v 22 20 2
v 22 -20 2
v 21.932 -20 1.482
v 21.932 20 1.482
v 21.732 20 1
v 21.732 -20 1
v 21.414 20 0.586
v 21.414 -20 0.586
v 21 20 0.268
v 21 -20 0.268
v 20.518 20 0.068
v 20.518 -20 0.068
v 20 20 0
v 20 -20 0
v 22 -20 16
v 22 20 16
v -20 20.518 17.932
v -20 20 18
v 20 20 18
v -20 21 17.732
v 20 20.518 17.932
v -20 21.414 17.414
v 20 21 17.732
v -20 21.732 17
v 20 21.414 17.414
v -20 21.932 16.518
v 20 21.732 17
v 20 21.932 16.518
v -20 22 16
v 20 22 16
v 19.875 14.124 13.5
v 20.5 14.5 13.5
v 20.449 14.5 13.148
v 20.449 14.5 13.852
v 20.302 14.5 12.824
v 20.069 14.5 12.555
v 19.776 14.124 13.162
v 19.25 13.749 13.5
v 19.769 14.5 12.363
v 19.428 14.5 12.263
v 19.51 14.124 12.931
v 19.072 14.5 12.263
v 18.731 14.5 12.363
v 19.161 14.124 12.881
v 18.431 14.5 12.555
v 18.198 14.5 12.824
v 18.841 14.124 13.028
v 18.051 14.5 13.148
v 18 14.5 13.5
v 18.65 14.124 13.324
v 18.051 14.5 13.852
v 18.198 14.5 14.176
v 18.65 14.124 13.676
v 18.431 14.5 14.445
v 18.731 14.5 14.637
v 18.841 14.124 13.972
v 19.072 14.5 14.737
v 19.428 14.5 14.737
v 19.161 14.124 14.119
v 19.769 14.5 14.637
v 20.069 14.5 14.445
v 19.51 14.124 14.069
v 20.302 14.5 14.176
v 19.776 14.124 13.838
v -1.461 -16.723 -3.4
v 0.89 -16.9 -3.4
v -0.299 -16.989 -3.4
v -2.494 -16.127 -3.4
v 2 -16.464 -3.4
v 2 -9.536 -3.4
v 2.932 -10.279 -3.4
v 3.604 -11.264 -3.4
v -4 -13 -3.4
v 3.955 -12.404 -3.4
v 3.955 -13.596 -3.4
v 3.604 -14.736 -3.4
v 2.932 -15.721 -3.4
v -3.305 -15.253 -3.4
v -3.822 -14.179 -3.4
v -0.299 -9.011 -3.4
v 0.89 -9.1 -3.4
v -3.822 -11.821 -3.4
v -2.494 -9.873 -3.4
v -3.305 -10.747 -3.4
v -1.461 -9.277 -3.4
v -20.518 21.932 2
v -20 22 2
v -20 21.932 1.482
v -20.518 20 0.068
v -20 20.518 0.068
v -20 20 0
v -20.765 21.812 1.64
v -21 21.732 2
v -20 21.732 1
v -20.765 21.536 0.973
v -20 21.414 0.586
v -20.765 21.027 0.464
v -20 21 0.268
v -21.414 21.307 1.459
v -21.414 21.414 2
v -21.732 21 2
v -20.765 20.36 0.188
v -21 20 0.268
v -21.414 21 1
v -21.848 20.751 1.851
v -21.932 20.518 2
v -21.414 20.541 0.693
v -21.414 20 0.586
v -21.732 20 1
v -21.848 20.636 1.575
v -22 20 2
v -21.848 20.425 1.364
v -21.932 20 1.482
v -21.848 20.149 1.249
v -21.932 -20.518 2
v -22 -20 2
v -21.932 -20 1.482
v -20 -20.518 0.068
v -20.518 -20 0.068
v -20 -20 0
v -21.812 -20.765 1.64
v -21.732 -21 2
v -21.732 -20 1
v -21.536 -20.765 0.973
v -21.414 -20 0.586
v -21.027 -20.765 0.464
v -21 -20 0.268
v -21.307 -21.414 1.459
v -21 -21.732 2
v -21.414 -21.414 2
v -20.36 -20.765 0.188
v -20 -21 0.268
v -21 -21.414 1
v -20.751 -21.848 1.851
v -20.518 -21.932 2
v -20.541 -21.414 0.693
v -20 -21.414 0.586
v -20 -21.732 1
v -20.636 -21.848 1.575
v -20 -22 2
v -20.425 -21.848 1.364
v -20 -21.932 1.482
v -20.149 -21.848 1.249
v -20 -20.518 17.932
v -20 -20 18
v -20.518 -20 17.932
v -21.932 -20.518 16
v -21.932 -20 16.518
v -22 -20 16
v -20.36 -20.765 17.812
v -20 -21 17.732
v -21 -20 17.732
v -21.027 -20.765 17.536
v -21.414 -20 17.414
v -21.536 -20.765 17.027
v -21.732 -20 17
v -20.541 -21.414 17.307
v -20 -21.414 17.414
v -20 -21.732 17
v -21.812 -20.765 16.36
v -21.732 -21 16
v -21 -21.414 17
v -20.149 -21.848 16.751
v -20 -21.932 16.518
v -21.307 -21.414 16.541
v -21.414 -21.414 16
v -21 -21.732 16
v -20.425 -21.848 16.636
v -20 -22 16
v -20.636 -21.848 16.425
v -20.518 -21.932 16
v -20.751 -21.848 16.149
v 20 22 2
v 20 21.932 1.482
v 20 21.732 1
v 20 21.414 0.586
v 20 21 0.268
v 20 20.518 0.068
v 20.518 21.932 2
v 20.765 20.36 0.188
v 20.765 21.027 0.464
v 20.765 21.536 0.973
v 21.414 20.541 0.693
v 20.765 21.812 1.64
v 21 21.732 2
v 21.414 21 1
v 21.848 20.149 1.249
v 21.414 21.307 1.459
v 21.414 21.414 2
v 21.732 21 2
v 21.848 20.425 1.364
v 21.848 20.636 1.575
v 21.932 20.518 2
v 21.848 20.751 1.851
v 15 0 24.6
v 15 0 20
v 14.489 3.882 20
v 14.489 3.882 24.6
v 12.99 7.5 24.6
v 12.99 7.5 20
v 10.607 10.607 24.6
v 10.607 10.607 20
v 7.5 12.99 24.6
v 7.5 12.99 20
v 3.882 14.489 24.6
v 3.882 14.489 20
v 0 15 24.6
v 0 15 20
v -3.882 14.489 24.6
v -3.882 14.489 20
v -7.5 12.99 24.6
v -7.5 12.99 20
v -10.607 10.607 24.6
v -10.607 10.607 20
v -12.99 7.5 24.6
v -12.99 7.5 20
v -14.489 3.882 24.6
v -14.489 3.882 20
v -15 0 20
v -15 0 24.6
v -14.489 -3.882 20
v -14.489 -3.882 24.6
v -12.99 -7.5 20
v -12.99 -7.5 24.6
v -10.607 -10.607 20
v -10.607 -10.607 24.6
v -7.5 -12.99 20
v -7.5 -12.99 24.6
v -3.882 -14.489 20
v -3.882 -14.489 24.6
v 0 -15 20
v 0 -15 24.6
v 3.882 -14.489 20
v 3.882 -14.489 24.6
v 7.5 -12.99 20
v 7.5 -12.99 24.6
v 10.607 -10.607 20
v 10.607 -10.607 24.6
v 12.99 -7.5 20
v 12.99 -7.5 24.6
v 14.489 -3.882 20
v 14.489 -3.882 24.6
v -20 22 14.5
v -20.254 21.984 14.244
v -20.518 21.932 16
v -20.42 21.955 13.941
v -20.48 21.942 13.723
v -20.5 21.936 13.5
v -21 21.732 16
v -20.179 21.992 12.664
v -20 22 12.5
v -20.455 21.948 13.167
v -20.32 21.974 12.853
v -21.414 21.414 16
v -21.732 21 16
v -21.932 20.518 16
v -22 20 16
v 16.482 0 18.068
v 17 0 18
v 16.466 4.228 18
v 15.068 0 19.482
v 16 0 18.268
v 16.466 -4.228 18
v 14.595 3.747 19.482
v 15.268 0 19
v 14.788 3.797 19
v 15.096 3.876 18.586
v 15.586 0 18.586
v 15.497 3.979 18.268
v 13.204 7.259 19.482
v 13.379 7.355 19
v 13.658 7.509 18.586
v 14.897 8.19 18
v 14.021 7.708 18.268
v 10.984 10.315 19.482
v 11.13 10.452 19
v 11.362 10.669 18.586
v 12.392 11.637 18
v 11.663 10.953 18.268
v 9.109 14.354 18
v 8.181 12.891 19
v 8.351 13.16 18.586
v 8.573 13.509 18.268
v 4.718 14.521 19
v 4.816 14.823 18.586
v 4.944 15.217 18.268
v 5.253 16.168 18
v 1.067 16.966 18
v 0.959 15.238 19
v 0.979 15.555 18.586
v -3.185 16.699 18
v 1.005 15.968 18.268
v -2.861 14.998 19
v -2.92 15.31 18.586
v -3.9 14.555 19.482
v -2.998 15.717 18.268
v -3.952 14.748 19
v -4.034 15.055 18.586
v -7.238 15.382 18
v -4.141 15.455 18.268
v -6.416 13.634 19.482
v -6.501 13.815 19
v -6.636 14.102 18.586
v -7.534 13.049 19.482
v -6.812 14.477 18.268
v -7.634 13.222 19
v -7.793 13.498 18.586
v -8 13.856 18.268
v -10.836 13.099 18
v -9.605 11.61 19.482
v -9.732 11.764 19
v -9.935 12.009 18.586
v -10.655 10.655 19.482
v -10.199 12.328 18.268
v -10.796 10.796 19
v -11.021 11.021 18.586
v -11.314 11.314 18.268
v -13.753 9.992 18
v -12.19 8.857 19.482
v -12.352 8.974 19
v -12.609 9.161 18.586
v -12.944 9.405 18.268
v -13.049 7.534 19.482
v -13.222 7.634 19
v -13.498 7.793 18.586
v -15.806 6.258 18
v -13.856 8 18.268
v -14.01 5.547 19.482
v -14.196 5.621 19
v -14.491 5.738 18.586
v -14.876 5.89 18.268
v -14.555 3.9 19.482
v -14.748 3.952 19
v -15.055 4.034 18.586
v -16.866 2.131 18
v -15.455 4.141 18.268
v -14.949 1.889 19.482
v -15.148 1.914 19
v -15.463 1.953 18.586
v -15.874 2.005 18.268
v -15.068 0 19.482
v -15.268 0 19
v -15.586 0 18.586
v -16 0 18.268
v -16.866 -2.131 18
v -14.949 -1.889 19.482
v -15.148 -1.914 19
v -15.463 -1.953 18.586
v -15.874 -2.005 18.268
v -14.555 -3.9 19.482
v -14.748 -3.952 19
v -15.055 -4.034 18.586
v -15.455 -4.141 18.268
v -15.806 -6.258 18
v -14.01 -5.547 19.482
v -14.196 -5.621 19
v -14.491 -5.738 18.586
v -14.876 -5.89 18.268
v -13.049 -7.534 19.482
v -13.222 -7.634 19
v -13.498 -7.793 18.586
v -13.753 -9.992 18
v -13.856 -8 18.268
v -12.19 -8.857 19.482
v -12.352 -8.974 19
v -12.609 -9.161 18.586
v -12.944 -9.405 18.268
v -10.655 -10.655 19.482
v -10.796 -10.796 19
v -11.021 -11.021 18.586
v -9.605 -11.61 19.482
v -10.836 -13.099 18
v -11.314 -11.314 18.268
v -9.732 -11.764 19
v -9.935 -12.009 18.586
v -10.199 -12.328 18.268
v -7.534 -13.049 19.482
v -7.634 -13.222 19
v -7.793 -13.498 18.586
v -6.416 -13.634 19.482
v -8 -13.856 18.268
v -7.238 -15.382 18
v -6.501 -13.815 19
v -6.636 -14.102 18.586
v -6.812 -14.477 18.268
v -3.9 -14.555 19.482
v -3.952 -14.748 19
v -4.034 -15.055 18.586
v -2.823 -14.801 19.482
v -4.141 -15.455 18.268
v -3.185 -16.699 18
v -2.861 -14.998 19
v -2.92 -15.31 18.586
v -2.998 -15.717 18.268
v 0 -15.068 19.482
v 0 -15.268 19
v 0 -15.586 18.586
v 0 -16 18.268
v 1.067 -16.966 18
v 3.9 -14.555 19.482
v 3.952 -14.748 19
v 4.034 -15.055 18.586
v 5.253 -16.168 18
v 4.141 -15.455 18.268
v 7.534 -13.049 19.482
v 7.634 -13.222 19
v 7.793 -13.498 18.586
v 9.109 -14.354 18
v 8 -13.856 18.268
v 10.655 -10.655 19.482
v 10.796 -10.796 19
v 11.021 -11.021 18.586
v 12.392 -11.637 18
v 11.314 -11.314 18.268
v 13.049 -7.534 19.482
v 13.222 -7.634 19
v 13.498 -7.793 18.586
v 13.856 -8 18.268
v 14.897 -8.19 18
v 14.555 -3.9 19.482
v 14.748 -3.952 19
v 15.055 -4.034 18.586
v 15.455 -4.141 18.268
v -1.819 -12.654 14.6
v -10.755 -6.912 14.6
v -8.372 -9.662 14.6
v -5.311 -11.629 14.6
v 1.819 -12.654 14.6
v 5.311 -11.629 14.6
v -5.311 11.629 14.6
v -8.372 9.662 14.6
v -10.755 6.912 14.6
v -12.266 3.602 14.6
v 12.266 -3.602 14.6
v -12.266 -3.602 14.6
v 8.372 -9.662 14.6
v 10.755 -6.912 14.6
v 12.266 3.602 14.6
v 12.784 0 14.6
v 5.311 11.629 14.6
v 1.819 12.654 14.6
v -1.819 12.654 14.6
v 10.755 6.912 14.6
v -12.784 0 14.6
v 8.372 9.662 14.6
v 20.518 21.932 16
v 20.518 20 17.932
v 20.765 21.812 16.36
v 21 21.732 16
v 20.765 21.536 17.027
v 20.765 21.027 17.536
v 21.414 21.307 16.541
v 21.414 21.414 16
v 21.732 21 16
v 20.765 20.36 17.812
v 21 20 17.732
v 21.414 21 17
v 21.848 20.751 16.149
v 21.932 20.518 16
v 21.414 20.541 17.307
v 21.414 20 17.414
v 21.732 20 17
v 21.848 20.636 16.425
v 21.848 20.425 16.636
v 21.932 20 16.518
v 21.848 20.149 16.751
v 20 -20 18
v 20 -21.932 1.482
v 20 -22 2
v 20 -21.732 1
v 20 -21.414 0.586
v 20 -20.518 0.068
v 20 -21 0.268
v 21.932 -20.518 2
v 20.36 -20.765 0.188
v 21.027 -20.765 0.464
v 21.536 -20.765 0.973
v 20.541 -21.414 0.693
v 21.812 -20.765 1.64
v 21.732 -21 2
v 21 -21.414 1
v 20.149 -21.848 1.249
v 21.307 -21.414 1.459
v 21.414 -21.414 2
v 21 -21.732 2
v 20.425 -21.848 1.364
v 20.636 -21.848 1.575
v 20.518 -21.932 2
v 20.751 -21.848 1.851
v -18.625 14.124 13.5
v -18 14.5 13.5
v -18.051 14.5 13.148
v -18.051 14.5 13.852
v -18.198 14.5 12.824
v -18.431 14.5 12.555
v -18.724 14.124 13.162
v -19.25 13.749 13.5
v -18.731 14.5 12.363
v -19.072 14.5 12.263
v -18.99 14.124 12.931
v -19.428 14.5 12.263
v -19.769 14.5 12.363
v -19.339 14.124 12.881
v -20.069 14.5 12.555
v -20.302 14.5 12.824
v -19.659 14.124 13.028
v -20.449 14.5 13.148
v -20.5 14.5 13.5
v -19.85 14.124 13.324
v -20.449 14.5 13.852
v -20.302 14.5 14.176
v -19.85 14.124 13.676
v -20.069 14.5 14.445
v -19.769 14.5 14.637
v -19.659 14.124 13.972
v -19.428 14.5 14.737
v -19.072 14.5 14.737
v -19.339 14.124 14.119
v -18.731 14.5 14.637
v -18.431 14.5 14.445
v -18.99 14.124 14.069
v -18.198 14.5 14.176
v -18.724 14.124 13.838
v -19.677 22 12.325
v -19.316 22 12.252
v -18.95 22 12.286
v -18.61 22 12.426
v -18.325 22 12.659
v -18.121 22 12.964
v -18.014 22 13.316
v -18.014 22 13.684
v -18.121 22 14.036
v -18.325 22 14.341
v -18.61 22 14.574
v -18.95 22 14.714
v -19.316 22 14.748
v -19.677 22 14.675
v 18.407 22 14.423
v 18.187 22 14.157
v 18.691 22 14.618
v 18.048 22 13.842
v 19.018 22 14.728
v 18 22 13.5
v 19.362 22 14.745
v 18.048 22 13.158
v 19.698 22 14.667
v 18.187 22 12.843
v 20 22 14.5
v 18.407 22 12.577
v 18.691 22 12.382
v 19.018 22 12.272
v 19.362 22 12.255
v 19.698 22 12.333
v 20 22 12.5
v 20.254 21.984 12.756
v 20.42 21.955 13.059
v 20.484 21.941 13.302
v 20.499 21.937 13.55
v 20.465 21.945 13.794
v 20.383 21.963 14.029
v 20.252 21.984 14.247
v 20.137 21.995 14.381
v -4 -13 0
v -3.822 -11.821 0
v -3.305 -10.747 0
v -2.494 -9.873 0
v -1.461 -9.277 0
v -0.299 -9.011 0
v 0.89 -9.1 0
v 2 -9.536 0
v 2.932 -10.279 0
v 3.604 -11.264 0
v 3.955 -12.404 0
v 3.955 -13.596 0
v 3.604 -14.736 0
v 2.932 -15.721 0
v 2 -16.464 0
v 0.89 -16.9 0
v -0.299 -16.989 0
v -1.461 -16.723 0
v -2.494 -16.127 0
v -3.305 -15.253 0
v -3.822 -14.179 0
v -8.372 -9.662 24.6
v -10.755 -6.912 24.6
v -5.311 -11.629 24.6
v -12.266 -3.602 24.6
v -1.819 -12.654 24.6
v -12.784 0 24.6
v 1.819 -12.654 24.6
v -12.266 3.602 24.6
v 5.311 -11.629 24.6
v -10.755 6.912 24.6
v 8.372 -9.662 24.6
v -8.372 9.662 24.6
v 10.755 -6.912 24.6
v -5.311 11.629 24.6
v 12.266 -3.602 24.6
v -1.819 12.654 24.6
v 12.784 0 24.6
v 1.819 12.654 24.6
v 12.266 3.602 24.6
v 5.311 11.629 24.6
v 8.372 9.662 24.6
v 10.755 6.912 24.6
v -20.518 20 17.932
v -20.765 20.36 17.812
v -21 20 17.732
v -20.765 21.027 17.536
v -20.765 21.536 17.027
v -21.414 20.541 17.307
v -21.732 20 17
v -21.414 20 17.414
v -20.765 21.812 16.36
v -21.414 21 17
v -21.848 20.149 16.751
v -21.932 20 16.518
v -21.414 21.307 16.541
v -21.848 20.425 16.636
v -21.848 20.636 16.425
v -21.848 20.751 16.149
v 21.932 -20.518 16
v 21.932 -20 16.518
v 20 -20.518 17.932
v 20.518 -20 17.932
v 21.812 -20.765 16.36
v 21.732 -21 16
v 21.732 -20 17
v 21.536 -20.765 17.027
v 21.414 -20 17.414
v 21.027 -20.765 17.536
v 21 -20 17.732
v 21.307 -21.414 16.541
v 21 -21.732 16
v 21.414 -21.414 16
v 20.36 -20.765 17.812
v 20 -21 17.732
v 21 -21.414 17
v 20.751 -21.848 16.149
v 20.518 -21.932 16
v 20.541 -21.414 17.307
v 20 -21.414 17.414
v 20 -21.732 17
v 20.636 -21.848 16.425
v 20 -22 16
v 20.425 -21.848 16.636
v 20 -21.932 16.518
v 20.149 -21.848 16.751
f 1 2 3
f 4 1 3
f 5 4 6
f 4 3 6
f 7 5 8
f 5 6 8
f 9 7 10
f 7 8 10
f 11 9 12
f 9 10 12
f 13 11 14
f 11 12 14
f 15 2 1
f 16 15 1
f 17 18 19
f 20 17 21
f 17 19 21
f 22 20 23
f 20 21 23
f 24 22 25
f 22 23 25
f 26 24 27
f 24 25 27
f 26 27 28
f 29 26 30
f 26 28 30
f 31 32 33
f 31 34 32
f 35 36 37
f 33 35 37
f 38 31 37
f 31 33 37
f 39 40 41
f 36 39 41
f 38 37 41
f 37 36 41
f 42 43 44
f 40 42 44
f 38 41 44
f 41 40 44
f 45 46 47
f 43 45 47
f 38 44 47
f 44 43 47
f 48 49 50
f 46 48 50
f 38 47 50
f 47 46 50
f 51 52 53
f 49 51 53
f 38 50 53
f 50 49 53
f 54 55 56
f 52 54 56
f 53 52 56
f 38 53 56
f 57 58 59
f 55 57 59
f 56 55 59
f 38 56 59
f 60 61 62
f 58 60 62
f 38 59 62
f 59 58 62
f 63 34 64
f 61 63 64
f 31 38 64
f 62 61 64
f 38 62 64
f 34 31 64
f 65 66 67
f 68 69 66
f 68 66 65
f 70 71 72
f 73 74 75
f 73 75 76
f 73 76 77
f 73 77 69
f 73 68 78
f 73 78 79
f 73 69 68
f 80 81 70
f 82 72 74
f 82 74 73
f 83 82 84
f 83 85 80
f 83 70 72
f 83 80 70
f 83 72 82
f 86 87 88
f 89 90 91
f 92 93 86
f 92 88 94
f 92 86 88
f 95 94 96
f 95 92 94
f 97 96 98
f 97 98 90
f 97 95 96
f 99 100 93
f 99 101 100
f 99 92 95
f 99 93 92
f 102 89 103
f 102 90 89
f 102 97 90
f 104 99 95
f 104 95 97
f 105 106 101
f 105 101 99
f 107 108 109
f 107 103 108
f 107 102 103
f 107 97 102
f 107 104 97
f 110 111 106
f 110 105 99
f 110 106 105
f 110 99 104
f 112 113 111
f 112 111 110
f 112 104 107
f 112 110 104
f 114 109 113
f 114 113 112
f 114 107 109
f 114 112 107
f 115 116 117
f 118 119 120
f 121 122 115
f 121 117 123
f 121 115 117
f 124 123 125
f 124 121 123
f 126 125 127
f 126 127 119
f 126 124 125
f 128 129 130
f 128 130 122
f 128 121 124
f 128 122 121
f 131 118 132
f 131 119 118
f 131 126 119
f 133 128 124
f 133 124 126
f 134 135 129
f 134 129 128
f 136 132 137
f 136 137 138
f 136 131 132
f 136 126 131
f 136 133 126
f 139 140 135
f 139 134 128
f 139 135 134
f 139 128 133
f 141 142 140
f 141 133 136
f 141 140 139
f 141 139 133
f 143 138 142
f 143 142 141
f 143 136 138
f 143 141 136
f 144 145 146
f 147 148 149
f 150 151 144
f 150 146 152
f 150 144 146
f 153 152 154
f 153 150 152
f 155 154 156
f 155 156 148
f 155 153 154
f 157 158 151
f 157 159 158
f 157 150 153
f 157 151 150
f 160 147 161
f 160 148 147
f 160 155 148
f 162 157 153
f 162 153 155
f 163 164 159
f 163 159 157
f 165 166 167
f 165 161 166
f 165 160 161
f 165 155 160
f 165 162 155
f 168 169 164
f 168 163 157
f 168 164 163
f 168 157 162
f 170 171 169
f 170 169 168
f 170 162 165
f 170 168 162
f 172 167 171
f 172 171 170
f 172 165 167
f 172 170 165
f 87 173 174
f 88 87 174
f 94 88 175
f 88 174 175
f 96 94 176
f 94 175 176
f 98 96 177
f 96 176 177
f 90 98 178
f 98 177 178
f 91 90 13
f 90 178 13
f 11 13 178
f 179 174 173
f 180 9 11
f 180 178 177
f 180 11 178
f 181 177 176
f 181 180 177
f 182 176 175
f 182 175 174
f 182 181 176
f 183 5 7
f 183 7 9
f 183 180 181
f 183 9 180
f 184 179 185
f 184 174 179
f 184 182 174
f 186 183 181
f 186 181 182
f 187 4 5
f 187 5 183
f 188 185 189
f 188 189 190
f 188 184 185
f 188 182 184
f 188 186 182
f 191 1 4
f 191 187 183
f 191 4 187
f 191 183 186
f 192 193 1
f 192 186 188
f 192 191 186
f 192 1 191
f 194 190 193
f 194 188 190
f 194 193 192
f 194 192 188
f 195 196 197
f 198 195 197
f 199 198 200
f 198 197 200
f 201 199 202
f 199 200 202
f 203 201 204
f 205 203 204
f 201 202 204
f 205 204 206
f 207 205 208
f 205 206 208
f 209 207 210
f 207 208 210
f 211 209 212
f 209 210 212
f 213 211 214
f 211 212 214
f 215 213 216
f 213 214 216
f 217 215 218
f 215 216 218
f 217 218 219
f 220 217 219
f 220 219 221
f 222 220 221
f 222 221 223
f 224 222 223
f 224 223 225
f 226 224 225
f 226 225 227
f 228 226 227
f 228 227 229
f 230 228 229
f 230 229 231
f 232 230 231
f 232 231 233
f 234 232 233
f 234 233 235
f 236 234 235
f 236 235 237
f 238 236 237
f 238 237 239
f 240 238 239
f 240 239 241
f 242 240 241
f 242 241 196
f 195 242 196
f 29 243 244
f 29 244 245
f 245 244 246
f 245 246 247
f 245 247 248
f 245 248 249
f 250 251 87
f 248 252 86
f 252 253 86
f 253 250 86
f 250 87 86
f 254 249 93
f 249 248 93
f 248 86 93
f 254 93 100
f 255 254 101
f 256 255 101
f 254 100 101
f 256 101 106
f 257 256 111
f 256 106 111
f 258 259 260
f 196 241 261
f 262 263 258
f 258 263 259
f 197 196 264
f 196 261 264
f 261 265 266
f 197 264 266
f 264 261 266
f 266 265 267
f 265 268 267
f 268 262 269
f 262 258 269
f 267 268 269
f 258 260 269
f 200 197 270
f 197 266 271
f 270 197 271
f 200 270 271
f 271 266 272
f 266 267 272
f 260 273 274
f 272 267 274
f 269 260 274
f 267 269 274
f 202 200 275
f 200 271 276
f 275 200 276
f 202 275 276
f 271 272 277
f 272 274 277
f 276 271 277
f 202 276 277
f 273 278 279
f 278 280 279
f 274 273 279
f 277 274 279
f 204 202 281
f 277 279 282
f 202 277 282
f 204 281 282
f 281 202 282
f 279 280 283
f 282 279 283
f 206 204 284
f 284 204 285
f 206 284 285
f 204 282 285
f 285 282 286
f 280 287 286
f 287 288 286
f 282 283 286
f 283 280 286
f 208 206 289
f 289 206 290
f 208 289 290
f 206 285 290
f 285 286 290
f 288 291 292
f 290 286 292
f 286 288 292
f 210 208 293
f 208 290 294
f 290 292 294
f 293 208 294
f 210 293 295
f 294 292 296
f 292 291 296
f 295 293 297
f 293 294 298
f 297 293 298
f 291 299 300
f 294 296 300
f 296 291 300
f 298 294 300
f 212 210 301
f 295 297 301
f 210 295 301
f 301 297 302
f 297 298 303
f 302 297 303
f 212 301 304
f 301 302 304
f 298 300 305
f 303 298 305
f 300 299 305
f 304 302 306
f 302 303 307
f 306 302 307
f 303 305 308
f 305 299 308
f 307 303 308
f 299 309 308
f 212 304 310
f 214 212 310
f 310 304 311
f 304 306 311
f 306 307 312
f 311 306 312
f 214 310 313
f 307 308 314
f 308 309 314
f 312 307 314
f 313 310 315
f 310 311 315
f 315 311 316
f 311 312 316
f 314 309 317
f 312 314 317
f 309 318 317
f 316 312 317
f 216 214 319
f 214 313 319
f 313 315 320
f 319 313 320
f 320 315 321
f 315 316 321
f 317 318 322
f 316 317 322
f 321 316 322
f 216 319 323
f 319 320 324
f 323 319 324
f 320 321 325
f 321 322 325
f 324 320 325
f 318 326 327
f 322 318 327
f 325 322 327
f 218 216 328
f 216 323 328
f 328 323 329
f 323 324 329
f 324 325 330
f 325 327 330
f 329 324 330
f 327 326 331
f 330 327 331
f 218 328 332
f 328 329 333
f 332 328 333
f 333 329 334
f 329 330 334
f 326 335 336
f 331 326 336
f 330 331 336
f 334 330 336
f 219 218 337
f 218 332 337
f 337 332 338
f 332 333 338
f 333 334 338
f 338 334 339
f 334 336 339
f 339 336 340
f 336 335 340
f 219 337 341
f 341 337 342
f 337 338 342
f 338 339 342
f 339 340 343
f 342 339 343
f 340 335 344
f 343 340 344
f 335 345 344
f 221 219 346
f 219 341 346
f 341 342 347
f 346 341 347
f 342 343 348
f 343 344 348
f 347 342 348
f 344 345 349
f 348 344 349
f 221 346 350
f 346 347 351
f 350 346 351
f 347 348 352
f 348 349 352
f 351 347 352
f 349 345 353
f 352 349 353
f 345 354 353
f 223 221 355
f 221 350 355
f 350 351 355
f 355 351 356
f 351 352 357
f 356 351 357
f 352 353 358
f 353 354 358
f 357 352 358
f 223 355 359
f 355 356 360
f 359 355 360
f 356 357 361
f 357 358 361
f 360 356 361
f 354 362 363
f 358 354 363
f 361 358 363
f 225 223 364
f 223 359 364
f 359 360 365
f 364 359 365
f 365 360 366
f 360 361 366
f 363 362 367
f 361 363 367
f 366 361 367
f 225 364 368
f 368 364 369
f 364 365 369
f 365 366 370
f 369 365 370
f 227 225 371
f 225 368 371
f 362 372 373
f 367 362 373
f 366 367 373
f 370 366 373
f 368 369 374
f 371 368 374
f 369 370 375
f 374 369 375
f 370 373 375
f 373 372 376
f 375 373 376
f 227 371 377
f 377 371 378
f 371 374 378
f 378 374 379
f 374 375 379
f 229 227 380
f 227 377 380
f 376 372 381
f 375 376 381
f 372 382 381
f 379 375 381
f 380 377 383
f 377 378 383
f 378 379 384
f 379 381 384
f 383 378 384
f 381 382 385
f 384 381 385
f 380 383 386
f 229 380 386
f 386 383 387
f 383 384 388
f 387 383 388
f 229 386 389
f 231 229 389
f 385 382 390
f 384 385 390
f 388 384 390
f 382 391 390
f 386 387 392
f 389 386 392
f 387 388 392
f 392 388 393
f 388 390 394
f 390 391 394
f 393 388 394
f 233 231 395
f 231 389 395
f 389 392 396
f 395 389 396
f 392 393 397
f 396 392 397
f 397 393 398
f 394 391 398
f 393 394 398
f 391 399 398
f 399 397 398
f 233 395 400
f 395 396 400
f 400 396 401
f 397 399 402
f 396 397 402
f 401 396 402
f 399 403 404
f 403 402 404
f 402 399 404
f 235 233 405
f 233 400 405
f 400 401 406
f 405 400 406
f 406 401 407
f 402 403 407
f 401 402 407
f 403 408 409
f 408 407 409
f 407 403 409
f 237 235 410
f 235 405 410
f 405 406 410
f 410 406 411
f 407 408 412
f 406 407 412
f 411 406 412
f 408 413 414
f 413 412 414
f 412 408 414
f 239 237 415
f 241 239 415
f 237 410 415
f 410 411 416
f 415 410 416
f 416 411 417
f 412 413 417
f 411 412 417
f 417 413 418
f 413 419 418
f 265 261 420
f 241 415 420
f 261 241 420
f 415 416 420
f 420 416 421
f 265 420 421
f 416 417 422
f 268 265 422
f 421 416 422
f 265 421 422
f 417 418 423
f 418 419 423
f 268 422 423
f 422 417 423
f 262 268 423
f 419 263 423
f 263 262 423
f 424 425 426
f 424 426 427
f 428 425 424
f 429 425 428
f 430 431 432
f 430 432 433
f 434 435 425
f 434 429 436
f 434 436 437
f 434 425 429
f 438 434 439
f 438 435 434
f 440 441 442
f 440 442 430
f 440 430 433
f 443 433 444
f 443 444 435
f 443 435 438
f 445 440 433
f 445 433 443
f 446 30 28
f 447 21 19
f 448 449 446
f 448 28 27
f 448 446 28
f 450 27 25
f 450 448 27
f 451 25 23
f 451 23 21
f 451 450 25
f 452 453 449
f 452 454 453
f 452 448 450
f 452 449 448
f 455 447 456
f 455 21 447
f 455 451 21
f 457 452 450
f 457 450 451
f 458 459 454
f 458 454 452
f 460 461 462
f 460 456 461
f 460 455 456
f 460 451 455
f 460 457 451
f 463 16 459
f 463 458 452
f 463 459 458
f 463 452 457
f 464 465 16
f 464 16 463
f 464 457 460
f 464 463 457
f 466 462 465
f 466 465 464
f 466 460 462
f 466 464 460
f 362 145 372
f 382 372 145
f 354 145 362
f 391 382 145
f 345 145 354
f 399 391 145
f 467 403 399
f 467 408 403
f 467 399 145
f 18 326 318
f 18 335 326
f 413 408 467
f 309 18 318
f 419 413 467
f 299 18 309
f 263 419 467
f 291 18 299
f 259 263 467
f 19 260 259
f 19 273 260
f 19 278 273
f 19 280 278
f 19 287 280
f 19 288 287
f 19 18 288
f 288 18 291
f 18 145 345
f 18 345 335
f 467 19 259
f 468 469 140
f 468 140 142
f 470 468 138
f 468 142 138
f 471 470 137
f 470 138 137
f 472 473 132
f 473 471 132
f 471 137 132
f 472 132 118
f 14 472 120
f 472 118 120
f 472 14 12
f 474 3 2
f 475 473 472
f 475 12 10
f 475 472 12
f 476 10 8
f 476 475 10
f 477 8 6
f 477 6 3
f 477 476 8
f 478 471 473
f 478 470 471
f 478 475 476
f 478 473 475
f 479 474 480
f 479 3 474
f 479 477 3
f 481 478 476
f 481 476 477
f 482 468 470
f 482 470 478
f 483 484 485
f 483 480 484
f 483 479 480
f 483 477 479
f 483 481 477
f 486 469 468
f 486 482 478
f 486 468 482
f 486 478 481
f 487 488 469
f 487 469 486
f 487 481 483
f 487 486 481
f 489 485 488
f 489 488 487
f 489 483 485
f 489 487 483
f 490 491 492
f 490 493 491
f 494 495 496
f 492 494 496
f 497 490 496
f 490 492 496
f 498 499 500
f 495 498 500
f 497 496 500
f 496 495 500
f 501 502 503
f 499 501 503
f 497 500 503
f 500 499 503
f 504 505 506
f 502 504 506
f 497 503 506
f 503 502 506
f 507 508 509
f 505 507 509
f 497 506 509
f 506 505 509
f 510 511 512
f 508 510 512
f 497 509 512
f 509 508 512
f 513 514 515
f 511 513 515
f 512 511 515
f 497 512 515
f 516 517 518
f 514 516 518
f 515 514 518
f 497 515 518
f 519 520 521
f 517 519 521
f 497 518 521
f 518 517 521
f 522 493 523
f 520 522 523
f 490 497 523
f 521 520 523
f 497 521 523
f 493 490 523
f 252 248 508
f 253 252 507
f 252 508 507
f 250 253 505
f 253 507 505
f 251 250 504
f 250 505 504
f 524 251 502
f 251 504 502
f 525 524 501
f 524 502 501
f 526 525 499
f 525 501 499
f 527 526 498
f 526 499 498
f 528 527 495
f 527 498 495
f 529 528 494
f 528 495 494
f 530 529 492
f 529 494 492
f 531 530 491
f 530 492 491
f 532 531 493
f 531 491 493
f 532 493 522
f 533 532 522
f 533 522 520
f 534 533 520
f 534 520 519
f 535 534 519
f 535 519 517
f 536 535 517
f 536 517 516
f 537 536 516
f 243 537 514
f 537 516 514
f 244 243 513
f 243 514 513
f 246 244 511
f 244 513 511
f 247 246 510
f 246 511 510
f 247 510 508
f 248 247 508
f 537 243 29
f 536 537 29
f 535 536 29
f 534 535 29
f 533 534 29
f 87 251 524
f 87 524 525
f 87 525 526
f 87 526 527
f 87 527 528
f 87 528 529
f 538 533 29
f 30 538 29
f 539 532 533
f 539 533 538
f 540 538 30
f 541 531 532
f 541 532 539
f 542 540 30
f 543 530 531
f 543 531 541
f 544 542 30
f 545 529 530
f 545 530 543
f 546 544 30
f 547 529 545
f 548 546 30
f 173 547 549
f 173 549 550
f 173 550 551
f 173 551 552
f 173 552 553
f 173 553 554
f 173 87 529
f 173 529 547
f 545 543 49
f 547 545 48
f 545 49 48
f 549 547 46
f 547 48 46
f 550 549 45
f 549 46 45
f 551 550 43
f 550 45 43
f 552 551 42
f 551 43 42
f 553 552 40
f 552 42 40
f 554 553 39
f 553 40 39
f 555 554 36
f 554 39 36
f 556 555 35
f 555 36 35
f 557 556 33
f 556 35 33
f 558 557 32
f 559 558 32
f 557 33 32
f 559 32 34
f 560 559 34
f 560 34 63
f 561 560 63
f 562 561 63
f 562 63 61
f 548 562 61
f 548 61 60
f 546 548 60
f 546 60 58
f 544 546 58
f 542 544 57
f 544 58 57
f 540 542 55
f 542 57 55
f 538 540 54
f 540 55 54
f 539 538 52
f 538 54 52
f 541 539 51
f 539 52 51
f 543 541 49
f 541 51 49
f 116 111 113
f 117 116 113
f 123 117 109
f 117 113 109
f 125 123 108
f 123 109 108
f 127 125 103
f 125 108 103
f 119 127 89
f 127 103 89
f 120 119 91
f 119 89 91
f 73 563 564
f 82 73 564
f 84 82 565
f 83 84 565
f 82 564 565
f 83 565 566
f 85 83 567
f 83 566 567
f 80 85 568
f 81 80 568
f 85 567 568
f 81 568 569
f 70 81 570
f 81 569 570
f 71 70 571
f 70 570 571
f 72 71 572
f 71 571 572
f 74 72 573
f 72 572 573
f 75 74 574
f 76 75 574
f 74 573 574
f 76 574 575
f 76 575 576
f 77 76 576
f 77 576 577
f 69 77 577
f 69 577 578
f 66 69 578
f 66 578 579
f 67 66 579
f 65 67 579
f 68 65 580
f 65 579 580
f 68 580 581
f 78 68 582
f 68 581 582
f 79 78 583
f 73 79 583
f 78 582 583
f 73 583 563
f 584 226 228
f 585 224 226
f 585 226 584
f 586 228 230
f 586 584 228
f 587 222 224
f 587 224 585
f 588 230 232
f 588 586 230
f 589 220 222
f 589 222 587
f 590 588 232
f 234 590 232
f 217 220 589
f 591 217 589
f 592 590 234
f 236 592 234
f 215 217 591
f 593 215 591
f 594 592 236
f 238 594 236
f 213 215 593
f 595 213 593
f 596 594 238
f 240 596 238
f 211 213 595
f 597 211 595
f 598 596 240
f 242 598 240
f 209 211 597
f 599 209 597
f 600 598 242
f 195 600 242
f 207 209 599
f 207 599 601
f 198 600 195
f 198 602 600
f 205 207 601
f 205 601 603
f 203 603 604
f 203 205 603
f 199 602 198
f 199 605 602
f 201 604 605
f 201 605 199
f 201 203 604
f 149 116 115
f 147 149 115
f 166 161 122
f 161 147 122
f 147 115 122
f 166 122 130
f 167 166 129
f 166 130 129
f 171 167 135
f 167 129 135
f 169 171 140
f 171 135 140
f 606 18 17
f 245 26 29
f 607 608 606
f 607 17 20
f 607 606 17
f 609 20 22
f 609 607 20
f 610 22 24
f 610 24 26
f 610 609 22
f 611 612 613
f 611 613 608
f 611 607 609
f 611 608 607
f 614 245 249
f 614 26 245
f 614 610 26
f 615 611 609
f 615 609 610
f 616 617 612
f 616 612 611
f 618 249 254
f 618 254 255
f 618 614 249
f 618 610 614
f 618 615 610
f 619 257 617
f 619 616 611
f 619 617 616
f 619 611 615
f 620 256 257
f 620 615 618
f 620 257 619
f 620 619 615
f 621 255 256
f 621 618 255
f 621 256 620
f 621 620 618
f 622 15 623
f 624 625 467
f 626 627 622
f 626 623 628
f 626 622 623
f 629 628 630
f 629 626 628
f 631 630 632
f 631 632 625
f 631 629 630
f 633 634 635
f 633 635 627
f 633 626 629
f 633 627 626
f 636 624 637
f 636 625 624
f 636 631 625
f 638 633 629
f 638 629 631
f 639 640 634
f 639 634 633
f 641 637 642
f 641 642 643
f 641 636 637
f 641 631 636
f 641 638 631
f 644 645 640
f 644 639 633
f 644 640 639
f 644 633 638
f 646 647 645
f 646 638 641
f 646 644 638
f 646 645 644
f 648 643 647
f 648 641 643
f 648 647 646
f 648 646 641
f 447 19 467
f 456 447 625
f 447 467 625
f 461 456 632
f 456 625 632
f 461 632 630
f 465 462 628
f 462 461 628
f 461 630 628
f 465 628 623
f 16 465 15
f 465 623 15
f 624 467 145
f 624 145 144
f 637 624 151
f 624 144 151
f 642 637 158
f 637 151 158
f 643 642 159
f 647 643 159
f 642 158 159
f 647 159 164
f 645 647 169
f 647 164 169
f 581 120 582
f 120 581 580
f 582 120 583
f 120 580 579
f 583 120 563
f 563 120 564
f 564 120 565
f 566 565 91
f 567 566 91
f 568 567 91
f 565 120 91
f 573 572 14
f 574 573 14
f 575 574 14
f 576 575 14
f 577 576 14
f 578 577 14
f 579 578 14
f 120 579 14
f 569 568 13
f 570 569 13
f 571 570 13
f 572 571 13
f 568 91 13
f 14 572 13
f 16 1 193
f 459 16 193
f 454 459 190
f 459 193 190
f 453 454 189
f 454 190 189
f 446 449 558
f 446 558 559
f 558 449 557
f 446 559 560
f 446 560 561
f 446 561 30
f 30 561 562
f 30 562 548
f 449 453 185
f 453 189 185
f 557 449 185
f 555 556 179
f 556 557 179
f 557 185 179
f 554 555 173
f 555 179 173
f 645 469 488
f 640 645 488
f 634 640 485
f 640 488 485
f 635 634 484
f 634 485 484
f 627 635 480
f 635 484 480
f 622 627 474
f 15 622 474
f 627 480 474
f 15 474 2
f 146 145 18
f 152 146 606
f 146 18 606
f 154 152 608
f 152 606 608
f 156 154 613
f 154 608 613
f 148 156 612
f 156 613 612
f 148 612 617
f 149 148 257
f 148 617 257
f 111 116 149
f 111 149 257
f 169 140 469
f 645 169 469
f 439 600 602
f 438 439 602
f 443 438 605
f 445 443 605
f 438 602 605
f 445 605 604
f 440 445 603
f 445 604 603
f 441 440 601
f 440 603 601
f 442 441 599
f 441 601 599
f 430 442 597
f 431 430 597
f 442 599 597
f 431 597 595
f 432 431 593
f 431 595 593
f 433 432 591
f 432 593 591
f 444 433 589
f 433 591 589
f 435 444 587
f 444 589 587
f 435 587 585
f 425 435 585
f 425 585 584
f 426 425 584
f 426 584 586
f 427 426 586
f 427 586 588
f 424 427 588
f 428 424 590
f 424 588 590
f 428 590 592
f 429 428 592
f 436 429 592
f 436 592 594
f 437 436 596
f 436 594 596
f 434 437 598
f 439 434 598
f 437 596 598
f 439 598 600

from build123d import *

# Parameters (mm, degrees)
SKETCH1_W             = 44
SKETCH1_H             = 44
BOSS_EXTRUDE1_DEPTH   = 18
SKETCH2_R             = 15
BOSS_EXTRUDE2_DEPTH   = 6.6
M3_TAPPED_HOLE1_D     = 2.5
M3_TAPPED_HOLE1_DEPTH = 7.5
M3_TAPPED_HOLE1_TIP   = 0.751075774
SKETCH5_R             = 4
BOSS_EXTRUDE3_DEPTH   = 3.4
FILLET2_R             = 2
SKETCH6_R             = 12.784207237
CUT_EXTRUDE1_DEPTH    = 10


with BuildPart() as part:
    # Sketch1 → Boss-Extrude1 (new body)
    with BuildSketch(Plane.XY):
        Rectangle(SKETCH1_W, SKETCH1_H)
    extrude(amount=BOSS_EXTRUDE1_DEPTH)

    # Sketch2 → Boss-Extrude2 (add)
    with BuildSketch(Plane.XY.offset(18)):
        Circle(SKETCH2_R)
    extrude(amount=BOSS_EXTRUDE2_DEPTH)

    # M3 Tapped Hole1
    with Locations(Plane(origin=(0, 22, 0), x_dir=(1, 0, 0), z_dir=(0, 1, 0))):
        with Locations((-19.25, -13.5), (19.25, -13.5)):
            Hole(M3_TAPPED_HOLE1_D / 2, depth=M3_TAPPED_HOLE1_DEPTH)
            with Locations((0, 0, -(M3_TAPPED_HOLE1_DEPTH + M3_TAPPED_HOLE1_TIP / 2))):  # 118° drill point
                Cone(0, M3_TAPPED_HOLE1_D / 2, M3_TAPPED_HOLE1_TIP, mode=Mode.SUBTRACT)

    # Sketch5 → Boss-Extrude3 (add)
    with BuildSketch(Plane(origin=(0, 0, 0), x_dir=(-1, 0, 0), z_dir=(0, 0, -1))):
        with Locations((0, -13)):
            Circle(SKETCH5_R)
    extrude(amount=BOSS_EXTRUDE3_DEPTH)

    # Fillet2
    # the kernel refuses this fillet: 2 mm, written as the material it adds along each edge
    with BuildSketch(Plane(origin=(0, 0, 18), x_dir=(1, 0, 0), z_dir=(0, -1, 0))) as fillet2_piece_1:
        with BuildLine():
            CenterArc((15 + FILLET2_R, FILLET2_R), FILLET2_R, 180, 90)
            Line((15, FILLET2_R), (15, 0))
            Line((15, 0), (15 + FILLET2_R, 0))
        make_face()
    revolve(axis=Axis((0, 0, 18), (0, 0, 1)))
    # the kernel refuses this fillet: 2 mm, written as the material it takes off along each edge
    with BuildSketch(Plane(origin=(-20, 20, 16), x_dir=(0, 0, 1), z_dir=(-1, 0, 0))) as fillet2_2_piece_1_section:
        Polygon((0, 0), (FILLET2_R, 0), (FILLET2_R, FILLET2_R), (0, FILLET2_R), align=None)
    fillet2_2_piece_1 = extrude(amount=FILLET2_R, mode=Mode.PRIVATE)
    fillet2_2_piece_1 = fillet2_2_piece_1 - Plane(origin=(-20, 20, 16), x_dir=(0, -0.7071067811865475, -0.7071067811865475), z_dir=(-1, 0, 0)) * Sphere(FILLET2_R, mode=Mode.PRIVATE)
    add(fillet2_2_piece_1, mode=Mode.SUBTRACT)
    with BuildSketch(Plane(origin=(-20, -20, 16), x_dir=(-1, 0, 0), z_dir=(0, -1, 0))) as fillet2_2_piece_2_section:
        Polygon((0, 0), (FILLET2_R, 0), (FILLET2_R, -FILLET2_R), (0, -FILLET2_R), align=None)
    fillet2_2_piece_2 = extrude(amount=FILLET2_R, mode=Mode.PRIVATE)
    fillet2_2_piece_2 = fillet2_2_piece_2 - Plane(origin=(-20, -20, 16), x_dir=(0.7071067811865475, 0, -0.7071067811865475), z_dir=(0, -1, 0)) * Sphere(FILLET2_R, mode=Mode.PRIVATE)
    add(fillet2_2_piece_2, mode=Mode.SUBTRACT)
    with BuildSketch(Plane(origin=(20, -20, 16), x_dir=(1, 0, 0), z_dir=(0, -1, 0))) as fillet2_2_piece_3_section:
        Polygon((0, 0), (FILLET2_R, 0), (FILLET2_R, FILLET2_R), (0, FILLET2_R), align=None)
    fillet2_2_piece_3 = extrude(amount=FILLET2_R, mode=Mode.PRIVATE)
    fillet2_2_piece_3 = fillet2_2_piece_3 - Plane(origin=(20, -20, 16), x_dir=(-0.7071067811865475, 0, -0.7071067811865475), z_dir=(0, -1, 0)) * Sphere(FILLET2_R, mode=Mode.PRIVATE)
    add(fillet2_2_piece_3, mode=Mode.SUBTRACT)
    with BuildSketch(Plane(origin=(20, 20, 16), x_dir=(0, 0, 1), z_dir=(1, 0, 0))) as fillet2_2_piece_4_section:
        Polygon((0, 0), (FILLET2_R, 0), (FILLET2_R, -FILLET2_R), (0, -FILLET2_R), align=None)
    fillet2_2_piece_4 = extrude(amount=FILLET2_R, mode=Mode.PRIVATE)
    fillet2_2_piece_4 = fillet2_2_piece_4 - Plane(origin=(20, 20, 16), x_dir=(0, -0.7071067811865475, -0.7071067811865475), z_dir=(1, 0, 0)) * Sphere(FILLET2_R, mode=Mode.PRIVATE)
    add(fillet2_2_piece_4, mode=Mode.SUBTRACT)
    with BuildSketch(Plane(origin=(-20, -20, 2), x_dir=(-1, 0, 0), z_dir=(0, -1, 0))) as fillet2_2_piece_5_section:
        Polygon((0, 0), (FILLET2_R, 0), (FILLET2_R, FILLET2_R), (0, FILLET2_R), align=None)
    fillet2_2_piece_5 = extrude(amount=FILLET2_R, mode=Mode.PRIVATE)
    fillet2_2_piece_5 = fillet2_2_piece_5 - Plane(origin=(-20, -20, 2), x_dir=(0.7071067811865475, 0, 0.7071067811865475), z_dir=(0, -1, 0)) * Sphere(FILLET2_R, mode=Mode.PRIVATE)
    add(fillet2_2_piece_5, mode=Mode.SUBTRACT)
    with BuildSketch(Plane(origin=(20, -20, 2), x_dir=(1, 0, 0), z_dir=(0, -1, 0))) as fillet2_2_piece_6_section:
        Polygon((0, 0), (FILLET2_R, 0), (FILLET2_R, -FILLET2_R), (0, -FILLET2_R), align=None)
    fillet2_2_piece_6 = extrude(amount=FILLET2_R, mode=Mode.PRIVATE)
    fillet2_2_piece_6 = fillet2_2_piece_6 - Plane(origin=(20, -20, 2), x_dir=(-0.7071067811865475, 0, 0.7071067811865475), z_dir=(0, -1, 0)) * Sphere(FILLET2_R, mode=Mode.PRIVATE)
    add(fillet2_2_piece_6, mode=Mode.SUBTRACT)
    with BuildSketch(Plane(origin=(-20, 20, 2), x_dir=(0, 0, -1), z_dir=(-1, 0, 0))) as fillet2_2_piece_7_section:
        Polygon((0, 0), (FILLET2_R, 0), (FILLET2_R, -FILLET2_R), (0, -FILLET2_R), align=None)
    fillet2_2_piece_7 = extrude(amount=FILLET2_R, mode=Mode.PRIVATE)
    fillet2_2_piece_7 = fillet2_2_piece_7 - Plane(origin=(-20, 20, 2), x_dir=(0, -0.7071067811865475, 0.7071067811865475), z_dir=(-1, 0, 0)) * Sphere(FILLET2_R, mode=Mode.PRIVATE)
    add(fillet2_2_piece_7, mode=Mode.SUBTRACT)
    with BuildSketch(Plane(origin=(20, 20, 2), x_dir=(0, 0, -1), z_dir=(1, 0, 0))) as fillet2_2_piece_8_section:
        Polygon((0, 0), (FILLET2_R, 0), (FILLET2_R, FILLET2_R), (0, FILLET2_R), align=None)
    fillet2_2_piece_8 = extrude(amount=FILLET2_R, mode=Mode.PRIVATE)
    fillet2_2_piece_8 = fillet2_2_piece_8 - Plane(origin=(20, 20, 2), x_dir=(0, -0.7071067811865475, 0.7071067811865475), z_dir=(1, 0, 0)) * Sphere(FILLET2_R, mode=Mode.PRIVATE)
    add(fillet2_2_piece_8, mode=Mode.SUBTRACT)
    with BuildSketch(Plane(origin=(-22, 20, 18), x_dir=(0, 0, -1), z_dir=(0, -1, 0)), Plane(origin=(-20, -22, 18), x_dir=(0, 0, -1), z_dir=(1, 0, 0)), Plane(origin=(22, -20, 18), x_dir=(0, 0, -1), z_dir=(0, 1, 0)), Plane(origin=(20, 22, 0), x_dir=(0, -1, 0), z_dir=(-1, 0, 0))) as fillet2_2_piece_9:
        with BuildLine():
            CenterArc((FILLET2_R, FILLET2_R), FILLET2_R, 180, 90)
            Line((0, FILLET2_R), (0, 0))
            Line((0, 0), (FILLET2_R, 0))
        make_face()
    extrude(amount=40, mode=Mode.SUBTRACT)
    with BuildSketch(Plane(origin=(-20, -22, 0), x_dir=(0, 0, 1), z_dir=(1, 0, 0)), Plane(origin=(-22, 20, 0), x_dir=(0, 0, 1), z_dir=(0, -1, 0)), Plane(origin=(22, -20, 0), x_dir=(0, 0, 1), z_dir=(0, 1, 0)), Plane(origin=(20, 22, 18), x_dir=(0, -1, 0), z_dir=(-1, 0, 0))) as fillet2_2_piece_10:
        with BuildLine():
            CenterArc((FILLET2_R, -FILLET2_R), FILLET2_R, 90, 90)
            Line((0, -FILLET2_R), (0, 0))
            Line((0, 0), (FILLET2_R, 0))
        make_face()
    extrude(amount=40, mode=Mode.SUBTRACT)
    with BuildSketch(Plane(origin=(22, -22, 2), x_dir=(-1, 0, 0), z_dir=(0, 0, 1)), Plane(origin=(22, 22, 2), x_dir=(0, -1, 0), z_dir=(0, 0, 1))) as fillet2_2_piece_11:
        with BuildLine():
            CenterArc((FILLET2_R, -FILLET2_R), FILLET2_R, 90, 90)
            Line((0, -FILLET2_R), (0, 0))
            Line((0, 0), (FILLET2_R, 0))
        make_face()
    extrude(amount=14, mode=Mode.SUBTRACT)
    with BuildSketch(Plane(origin=(-22, -22, 2), x_dir=(1, 0, 0), z_dir=(0, 0, 1)), Plane(origin=(-22, 22, 2), x_dir=(0, -1, 0), z_dir=(0, 0, 1))) as fillet2_2_piece_12:
        with BuildLine():
            CenterArc((FILLET2_R, FILLET2_R), FILLET2_R, 180, 90)
            Line((0, FILLET2_R), (0, 0))
            Line((0, 0), (FILLET2_R, 0))
        make_face()
    extrude(amount=14, mode=Mode.SUBTRACT)

    # Sketch6 → Cut-Extrude1 (cut)
    with BuildSketch(Plane.XY.offset(24.6)):
        Circle(SKETCH6_R)
    extrude(amount=-CUT_EXTRUDE1_DEPTH, mode=Mode.SUBTRACT)


solid = part.part
